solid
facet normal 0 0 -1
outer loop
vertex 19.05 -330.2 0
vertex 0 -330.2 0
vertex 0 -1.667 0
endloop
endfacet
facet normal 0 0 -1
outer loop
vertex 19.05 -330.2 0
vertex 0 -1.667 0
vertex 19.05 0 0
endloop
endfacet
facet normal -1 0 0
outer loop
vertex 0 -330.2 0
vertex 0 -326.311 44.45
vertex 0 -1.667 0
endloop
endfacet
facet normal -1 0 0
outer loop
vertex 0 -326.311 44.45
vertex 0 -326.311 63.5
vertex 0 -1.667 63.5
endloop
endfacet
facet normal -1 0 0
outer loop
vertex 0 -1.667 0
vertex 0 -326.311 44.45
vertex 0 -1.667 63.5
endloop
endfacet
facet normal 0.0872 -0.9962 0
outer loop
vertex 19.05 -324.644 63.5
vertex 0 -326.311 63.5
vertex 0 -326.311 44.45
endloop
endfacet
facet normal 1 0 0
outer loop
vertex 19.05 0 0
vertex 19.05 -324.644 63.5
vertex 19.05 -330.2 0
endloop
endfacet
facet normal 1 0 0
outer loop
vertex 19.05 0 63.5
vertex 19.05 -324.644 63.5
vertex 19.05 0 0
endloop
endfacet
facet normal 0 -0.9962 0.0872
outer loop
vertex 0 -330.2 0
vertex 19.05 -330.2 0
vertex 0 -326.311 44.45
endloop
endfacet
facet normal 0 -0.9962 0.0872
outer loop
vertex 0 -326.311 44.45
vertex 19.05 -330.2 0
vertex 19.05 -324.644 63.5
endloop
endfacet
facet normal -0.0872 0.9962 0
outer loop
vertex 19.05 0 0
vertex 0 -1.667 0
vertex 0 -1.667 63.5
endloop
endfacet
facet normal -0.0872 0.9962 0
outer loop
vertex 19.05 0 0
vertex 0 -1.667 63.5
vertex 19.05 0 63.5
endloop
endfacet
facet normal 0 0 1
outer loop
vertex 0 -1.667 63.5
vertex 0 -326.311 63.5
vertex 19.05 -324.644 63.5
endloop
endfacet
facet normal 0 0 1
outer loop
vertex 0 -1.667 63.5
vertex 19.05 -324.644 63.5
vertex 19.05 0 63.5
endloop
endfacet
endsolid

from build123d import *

# Parameters (mm, degrees)
F0_W     = 330.2
F0_H     = 63.5
F1_DEPTH = 19.05
F3_DEPTH = 63.501
F5_DEPTH = 19.051
F7_DEPTH = 63.5


with BuildPart() as f1:
    # F0 (on Right) → F1 (new body)
    with BuildSketch(Plane.YZ):
        with Locations((-165.1, 31.75)):
            Rectangle(F0_W, F0_H)
    extrude(amount=F1_DEPTH)

    # F2 (on face) → F3 (cut, through all)
    with BuildSketch(Plane.XY.offset(63.5)):
        Polygon((0, -1.666659), (19.05, 0), (0, 0), align=None)
    extrude(amount=-F3_DEPTH, mode=Mode.SUBTRACT)

    # F4 (on face) → F5 (cut, through all)
    with BuildSketch(Plane.YZ.offset(19.05)):
        Polygon((-324.64447, 63.5), (-330.2, 63.5), (-330.2, 0), align=None)
    extrude(amount=-F5_DEPTH, mode=Mode.SUBTRACT)

    # F6 (on face) → F7 (join)
    with BuildSketch(Plane.XY.offset(63.5)):
        Polygon((19.05, -324.64447), (0, -324.64447), (0, -326.311129), align=None)
    extrude(amount=-F7_DEPTH)


solid = f1.part
